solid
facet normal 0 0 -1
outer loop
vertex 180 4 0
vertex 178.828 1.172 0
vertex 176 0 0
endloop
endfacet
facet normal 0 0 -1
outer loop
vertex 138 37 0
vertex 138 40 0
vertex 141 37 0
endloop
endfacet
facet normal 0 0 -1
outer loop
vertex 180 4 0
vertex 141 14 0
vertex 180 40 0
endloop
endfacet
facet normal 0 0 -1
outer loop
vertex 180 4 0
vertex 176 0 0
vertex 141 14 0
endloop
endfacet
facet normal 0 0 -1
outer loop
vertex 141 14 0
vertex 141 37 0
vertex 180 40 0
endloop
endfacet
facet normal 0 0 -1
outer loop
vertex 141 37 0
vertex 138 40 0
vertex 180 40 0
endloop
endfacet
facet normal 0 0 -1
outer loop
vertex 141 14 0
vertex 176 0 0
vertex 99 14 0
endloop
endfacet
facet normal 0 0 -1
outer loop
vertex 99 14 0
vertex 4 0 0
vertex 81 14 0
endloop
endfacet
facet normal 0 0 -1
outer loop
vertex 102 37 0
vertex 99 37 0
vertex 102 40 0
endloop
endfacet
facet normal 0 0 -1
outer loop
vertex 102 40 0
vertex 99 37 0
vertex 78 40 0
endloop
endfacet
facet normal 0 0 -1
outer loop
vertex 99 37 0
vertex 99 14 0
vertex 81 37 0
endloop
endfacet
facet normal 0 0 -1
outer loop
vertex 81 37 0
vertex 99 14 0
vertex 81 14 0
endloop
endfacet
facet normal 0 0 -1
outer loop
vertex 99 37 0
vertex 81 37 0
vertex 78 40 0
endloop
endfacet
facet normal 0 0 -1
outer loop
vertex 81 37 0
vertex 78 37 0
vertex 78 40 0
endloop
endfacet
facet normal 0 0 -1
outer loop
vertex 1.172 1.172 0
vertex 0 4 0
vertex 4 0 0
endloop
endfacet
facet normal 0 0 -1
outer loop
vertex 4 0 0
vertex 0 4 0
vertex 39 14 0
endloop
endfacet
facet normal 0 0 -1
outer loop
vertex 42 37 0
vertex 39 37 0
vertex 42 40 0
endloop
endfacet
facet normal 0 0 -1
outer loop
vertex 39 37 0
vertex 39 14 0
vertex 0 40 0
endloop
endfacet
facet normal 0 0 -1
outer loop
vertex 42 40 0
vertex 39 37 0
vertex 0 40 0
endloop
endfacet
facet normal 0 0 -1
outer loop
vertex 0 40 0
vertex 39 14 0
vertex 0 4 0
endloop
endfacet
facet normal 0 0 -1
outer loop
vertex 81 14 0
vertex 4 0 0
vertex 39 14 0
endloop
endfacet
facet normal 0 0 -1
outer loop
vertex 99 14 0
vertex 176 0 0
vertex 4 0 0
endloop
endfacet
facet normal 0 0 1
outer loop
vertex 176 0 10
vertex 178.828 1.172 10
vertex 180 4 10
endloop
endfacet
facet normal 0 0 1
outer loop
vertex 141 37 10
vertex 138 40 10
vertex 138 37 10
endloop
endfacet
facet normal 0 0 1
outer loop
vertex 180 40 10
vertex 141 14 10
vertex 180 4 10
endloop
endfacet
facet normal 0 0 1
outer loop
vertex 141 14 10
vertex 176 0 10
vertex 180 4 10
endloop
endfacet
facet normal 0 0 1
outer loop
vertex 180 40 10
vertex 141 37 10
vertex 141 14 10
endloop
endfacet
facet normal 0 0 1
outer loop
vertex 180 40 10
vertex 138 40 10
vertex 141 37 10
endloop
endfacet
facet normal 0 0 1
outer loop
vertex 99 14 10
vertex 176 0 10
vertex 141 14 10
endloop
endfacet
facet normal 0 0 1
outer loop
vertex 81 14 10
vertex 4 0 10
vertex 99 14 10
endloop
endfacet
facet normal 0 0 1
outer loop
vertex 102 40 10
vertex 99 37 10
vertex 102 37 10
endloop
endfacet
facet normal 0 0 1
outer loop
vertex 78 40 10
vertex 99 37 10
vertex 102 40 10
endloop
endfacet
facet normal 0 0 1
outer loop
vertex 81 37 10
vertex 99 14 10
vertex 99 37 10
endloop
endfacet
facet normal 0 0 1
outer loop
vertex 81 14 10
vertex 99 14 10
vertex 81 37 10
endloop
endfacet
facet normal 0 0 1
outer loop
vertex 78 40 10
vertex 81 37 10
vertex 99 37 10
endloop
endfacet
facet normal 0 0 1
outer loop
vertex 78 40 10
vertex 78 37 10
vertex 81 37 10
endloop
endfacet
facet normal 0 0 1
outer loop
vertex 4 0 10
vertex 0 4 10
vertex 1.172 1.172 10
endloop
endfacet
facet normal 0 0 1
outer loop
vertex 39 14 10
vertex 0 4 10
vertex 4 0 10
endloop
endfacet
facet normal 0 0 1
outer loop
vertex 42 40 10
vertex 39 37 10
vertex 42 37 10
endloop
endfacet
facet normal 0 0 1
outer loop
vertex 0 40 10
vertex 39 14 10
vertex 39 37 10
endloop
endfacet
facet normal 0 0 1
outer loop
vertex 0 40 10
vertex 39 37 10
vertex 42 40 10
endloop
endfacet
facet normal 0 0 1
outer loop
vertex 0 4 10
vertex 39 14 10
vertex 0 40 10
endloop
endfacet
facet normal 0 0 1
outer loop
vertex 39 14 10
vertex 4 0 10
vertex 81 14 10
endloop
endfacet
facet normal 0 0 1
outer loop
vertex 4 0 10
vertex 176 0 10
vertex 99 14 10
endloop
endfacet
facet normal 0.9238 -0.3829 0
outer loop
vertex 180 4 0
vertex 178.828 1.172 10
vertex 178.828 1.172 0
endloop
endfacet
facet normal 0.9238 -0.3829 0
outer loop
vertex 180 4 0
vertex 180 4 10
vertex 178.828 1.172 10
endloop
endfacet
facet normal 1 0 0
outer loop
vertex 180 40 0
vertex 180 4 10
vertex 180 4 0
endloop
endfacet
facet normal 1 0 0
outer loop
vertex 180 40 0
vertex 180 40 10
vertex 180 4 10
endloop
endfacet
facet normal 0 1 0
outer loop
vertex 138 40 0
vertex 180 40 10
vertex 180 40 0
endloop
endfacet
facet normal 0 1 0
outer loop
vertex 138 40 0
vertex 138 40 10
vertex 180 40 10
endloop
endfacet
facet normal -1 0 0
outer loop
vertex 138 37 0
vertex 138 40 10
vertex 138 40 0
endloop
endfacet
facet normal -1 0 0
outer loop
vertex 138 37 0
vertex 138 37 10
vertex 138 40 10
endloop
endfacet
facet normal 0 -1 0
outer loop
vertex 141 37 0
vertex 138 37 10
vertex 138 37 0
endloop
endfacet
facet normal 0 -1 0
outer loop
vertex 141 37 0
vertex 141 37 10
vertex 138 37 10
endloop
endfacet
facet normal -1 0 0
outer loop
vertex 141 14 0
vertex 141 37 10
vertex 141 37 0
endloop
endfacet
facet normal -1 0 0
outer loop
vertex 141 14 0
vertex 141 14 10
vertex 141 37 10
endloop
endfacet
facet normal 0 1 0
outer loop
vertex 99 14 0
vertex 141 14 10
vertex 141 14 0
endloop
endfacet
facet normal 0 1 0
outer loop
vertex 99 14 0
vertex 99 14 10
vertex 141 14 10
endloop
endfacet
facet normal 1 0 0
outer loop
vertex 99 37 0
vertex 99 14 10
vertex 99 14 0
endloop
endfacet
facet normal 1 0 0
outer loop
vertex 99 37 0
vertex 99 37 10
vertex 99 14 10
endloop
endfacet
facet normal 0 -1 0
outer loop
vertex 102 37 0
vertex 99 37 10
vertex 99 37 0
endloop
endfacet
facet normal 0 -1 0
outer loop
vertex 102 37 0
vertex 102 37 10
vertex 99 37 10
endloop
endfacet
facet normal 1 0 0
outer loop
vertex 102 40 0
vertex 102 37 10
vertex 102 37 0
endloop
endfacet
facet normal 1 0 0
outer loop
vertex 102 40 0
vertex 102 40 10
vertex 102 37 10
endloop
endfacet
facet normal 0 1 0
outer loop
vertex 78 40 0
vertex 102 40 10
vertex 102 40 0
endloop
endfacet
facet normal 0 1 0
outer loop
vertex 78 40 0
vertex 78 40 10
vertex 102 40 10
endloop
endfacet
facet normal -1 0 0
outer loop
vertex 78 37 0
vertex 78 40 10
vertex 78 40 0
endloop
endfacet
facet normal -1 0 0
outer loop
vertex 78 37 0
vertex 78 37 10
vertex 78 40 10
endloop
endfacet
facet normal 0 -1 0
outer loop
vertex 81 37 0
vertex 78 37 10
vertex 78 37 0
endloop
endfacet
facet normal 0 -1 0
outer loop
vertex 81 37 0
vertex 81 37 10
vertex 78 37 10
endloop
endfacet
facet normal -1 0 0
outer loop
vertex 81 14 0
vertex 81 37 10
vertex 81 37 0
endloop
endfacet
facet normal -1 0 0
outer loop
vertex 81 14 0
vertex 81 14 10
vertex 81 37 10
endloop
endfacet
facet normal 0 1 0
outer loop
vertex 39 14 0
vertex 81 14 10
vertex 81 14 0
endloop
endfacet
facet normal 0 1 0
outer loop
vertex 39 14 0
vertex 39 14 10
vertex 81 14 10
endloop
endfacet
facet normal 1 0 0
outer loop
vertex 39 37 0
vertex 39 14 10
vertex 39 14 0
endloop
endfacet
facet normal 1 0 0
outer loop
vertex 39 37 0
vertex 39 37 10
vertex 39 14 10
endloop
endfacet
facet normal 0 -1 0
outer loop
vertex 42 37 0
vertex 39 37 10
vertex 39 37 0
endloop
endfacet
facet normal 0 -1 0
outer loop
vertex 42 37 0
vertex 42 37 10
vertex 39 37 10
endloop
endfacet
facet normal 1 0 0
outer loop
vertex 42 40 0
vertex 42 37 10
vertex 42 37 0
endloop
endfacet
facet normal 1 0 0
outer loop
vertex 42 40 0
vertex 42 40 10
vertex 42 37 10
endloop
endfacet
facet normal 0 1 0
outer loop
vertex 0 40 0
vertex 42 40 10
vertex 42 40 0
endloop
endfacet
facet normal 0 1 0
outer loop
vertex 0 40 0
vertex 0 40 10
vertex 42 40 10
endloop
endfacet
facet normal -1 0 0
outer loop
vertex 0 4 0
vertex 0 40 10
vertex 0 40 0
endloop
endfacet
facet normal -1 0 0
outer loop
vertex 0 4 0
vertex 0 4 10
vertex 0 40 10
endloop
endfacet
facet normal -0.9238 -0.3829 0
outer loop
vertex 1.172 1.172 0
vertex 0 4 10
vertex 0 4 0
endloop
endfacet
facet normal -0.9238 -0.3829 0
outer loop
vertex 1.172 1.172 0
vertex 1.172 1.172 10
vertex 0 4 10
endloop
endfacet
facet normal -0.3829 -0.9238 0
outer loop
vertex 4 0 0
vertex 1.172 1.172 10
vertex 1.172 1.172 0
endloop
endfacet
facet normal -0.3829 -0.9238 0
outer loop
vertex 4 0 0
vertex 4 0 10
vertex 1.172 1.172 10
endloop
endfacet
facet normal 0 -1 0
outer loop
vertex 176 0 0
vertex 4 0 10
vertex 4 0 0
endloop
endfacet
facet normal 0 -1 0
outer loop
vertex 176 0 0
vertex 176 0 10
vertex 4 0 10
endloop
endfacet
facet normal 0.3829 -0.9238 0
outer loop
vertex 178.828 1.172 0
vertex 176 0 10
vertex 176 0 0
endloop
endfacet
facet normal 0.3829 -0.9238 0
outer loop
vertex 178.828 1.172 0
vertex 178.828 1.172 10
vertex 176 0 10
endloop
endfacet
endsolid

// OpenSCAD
$fn = 32;

// ----------------------------------------------------------------------
// Oversize slot bar: 180 mm bar with 2 oversize windows
// ----------------------------------------------------------------------

// --- parameters (mm) ---
profile_height = 10;      // extrusion height
profile_points = 24;      // points of the closed outline

profile = [[0, 4], [1.172, 1.172], [4, 0], [176, 0], [178.828, 1.172], [180, 4], [180, 40], [138, 40], [138, 37], [141, 37], [141, 14], [99, 14], [99, 37], [102, 37], [102, 40], [78, 40], [78, 37], [81, 37], [81, 14], [39, 14], [39, 37], [42, 37], [42, 40], [0, 40]];  // single closed polygon, 24 points, counter clockwise

// --- the one profile operation ---
linear_extrude(height = profile_height) polygon(points = profile);
